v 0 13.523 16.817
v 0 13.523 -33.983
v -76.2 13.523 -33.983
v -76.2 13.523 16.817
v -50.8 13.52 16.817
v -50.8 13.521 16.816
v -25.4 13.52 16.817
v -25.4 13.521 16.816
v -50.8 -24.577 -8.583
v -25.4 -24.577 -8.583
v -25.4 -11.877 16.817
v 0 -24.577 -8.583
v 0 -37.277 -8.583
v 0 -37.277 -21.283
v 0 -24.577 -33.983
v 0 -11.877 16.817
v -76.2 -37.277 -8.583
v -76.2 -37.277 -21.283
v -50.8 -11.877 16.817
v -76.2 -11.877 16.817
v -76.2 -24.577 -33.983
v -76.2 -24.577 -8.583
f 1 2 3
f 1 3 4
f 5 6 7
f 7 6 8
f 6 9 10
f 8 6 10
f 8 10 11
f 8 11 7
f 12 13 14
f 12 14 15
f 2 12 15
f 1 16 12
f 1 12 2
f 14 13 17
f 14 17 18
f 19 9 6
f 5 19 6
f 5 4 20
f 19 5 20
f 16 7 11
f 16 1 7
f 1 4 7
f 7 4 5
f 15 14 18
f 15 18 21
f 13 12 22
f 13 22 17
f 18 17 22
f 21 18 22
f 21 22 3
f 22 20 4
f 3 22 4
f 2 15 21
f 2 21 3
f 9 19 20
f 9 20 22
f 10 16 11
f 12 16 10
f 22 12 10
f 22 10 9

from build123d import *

# Parameters (mm, degrees)
F1_DEPTH = 76.2
F3_DEPTH = 76.2
F5_W     = 25.4
F5_H     = 45.78858
F6_DEPTH = 25.4


with BuildPart() as f1:
    # F0 (on Right) → F1 (new body)
    with BuildSketch(Plane.YZ):
        Polygon((13.522523, 16.816804), (-11.877477, 16.816804), (-24.577477, -8.583196), (-24.577477, -33.983196), (13.522523, -33.983196), align=None)
    extrude(amount=-F1_DEPTH)

    # F2 (on face) → F3 (join)
    with BuildSketch(Plane.YZ):
        Polygon((-24.577477, -33.983196), (-24.577477, -8.583196), (-37.277477, -8.583196), (-37.277477, -21.283196), align=None)
    extrude(amount=-F3_DEPTH)

    # F5 (on face) → F6 (cut)
    with BuildSketch(Plane(origin=(0, -3.600826, 5.401239), x_dir=(1, 0, 0), z_dir=(0, -0.5547, 0.83205))):
        with Locations((-38.1, -2.316508)):
            Rectangle(F5_W, F5_H)
    extrude(amount=F6_DEPTH, mode=Mode.SUBTRACT)


solid = f1.part
